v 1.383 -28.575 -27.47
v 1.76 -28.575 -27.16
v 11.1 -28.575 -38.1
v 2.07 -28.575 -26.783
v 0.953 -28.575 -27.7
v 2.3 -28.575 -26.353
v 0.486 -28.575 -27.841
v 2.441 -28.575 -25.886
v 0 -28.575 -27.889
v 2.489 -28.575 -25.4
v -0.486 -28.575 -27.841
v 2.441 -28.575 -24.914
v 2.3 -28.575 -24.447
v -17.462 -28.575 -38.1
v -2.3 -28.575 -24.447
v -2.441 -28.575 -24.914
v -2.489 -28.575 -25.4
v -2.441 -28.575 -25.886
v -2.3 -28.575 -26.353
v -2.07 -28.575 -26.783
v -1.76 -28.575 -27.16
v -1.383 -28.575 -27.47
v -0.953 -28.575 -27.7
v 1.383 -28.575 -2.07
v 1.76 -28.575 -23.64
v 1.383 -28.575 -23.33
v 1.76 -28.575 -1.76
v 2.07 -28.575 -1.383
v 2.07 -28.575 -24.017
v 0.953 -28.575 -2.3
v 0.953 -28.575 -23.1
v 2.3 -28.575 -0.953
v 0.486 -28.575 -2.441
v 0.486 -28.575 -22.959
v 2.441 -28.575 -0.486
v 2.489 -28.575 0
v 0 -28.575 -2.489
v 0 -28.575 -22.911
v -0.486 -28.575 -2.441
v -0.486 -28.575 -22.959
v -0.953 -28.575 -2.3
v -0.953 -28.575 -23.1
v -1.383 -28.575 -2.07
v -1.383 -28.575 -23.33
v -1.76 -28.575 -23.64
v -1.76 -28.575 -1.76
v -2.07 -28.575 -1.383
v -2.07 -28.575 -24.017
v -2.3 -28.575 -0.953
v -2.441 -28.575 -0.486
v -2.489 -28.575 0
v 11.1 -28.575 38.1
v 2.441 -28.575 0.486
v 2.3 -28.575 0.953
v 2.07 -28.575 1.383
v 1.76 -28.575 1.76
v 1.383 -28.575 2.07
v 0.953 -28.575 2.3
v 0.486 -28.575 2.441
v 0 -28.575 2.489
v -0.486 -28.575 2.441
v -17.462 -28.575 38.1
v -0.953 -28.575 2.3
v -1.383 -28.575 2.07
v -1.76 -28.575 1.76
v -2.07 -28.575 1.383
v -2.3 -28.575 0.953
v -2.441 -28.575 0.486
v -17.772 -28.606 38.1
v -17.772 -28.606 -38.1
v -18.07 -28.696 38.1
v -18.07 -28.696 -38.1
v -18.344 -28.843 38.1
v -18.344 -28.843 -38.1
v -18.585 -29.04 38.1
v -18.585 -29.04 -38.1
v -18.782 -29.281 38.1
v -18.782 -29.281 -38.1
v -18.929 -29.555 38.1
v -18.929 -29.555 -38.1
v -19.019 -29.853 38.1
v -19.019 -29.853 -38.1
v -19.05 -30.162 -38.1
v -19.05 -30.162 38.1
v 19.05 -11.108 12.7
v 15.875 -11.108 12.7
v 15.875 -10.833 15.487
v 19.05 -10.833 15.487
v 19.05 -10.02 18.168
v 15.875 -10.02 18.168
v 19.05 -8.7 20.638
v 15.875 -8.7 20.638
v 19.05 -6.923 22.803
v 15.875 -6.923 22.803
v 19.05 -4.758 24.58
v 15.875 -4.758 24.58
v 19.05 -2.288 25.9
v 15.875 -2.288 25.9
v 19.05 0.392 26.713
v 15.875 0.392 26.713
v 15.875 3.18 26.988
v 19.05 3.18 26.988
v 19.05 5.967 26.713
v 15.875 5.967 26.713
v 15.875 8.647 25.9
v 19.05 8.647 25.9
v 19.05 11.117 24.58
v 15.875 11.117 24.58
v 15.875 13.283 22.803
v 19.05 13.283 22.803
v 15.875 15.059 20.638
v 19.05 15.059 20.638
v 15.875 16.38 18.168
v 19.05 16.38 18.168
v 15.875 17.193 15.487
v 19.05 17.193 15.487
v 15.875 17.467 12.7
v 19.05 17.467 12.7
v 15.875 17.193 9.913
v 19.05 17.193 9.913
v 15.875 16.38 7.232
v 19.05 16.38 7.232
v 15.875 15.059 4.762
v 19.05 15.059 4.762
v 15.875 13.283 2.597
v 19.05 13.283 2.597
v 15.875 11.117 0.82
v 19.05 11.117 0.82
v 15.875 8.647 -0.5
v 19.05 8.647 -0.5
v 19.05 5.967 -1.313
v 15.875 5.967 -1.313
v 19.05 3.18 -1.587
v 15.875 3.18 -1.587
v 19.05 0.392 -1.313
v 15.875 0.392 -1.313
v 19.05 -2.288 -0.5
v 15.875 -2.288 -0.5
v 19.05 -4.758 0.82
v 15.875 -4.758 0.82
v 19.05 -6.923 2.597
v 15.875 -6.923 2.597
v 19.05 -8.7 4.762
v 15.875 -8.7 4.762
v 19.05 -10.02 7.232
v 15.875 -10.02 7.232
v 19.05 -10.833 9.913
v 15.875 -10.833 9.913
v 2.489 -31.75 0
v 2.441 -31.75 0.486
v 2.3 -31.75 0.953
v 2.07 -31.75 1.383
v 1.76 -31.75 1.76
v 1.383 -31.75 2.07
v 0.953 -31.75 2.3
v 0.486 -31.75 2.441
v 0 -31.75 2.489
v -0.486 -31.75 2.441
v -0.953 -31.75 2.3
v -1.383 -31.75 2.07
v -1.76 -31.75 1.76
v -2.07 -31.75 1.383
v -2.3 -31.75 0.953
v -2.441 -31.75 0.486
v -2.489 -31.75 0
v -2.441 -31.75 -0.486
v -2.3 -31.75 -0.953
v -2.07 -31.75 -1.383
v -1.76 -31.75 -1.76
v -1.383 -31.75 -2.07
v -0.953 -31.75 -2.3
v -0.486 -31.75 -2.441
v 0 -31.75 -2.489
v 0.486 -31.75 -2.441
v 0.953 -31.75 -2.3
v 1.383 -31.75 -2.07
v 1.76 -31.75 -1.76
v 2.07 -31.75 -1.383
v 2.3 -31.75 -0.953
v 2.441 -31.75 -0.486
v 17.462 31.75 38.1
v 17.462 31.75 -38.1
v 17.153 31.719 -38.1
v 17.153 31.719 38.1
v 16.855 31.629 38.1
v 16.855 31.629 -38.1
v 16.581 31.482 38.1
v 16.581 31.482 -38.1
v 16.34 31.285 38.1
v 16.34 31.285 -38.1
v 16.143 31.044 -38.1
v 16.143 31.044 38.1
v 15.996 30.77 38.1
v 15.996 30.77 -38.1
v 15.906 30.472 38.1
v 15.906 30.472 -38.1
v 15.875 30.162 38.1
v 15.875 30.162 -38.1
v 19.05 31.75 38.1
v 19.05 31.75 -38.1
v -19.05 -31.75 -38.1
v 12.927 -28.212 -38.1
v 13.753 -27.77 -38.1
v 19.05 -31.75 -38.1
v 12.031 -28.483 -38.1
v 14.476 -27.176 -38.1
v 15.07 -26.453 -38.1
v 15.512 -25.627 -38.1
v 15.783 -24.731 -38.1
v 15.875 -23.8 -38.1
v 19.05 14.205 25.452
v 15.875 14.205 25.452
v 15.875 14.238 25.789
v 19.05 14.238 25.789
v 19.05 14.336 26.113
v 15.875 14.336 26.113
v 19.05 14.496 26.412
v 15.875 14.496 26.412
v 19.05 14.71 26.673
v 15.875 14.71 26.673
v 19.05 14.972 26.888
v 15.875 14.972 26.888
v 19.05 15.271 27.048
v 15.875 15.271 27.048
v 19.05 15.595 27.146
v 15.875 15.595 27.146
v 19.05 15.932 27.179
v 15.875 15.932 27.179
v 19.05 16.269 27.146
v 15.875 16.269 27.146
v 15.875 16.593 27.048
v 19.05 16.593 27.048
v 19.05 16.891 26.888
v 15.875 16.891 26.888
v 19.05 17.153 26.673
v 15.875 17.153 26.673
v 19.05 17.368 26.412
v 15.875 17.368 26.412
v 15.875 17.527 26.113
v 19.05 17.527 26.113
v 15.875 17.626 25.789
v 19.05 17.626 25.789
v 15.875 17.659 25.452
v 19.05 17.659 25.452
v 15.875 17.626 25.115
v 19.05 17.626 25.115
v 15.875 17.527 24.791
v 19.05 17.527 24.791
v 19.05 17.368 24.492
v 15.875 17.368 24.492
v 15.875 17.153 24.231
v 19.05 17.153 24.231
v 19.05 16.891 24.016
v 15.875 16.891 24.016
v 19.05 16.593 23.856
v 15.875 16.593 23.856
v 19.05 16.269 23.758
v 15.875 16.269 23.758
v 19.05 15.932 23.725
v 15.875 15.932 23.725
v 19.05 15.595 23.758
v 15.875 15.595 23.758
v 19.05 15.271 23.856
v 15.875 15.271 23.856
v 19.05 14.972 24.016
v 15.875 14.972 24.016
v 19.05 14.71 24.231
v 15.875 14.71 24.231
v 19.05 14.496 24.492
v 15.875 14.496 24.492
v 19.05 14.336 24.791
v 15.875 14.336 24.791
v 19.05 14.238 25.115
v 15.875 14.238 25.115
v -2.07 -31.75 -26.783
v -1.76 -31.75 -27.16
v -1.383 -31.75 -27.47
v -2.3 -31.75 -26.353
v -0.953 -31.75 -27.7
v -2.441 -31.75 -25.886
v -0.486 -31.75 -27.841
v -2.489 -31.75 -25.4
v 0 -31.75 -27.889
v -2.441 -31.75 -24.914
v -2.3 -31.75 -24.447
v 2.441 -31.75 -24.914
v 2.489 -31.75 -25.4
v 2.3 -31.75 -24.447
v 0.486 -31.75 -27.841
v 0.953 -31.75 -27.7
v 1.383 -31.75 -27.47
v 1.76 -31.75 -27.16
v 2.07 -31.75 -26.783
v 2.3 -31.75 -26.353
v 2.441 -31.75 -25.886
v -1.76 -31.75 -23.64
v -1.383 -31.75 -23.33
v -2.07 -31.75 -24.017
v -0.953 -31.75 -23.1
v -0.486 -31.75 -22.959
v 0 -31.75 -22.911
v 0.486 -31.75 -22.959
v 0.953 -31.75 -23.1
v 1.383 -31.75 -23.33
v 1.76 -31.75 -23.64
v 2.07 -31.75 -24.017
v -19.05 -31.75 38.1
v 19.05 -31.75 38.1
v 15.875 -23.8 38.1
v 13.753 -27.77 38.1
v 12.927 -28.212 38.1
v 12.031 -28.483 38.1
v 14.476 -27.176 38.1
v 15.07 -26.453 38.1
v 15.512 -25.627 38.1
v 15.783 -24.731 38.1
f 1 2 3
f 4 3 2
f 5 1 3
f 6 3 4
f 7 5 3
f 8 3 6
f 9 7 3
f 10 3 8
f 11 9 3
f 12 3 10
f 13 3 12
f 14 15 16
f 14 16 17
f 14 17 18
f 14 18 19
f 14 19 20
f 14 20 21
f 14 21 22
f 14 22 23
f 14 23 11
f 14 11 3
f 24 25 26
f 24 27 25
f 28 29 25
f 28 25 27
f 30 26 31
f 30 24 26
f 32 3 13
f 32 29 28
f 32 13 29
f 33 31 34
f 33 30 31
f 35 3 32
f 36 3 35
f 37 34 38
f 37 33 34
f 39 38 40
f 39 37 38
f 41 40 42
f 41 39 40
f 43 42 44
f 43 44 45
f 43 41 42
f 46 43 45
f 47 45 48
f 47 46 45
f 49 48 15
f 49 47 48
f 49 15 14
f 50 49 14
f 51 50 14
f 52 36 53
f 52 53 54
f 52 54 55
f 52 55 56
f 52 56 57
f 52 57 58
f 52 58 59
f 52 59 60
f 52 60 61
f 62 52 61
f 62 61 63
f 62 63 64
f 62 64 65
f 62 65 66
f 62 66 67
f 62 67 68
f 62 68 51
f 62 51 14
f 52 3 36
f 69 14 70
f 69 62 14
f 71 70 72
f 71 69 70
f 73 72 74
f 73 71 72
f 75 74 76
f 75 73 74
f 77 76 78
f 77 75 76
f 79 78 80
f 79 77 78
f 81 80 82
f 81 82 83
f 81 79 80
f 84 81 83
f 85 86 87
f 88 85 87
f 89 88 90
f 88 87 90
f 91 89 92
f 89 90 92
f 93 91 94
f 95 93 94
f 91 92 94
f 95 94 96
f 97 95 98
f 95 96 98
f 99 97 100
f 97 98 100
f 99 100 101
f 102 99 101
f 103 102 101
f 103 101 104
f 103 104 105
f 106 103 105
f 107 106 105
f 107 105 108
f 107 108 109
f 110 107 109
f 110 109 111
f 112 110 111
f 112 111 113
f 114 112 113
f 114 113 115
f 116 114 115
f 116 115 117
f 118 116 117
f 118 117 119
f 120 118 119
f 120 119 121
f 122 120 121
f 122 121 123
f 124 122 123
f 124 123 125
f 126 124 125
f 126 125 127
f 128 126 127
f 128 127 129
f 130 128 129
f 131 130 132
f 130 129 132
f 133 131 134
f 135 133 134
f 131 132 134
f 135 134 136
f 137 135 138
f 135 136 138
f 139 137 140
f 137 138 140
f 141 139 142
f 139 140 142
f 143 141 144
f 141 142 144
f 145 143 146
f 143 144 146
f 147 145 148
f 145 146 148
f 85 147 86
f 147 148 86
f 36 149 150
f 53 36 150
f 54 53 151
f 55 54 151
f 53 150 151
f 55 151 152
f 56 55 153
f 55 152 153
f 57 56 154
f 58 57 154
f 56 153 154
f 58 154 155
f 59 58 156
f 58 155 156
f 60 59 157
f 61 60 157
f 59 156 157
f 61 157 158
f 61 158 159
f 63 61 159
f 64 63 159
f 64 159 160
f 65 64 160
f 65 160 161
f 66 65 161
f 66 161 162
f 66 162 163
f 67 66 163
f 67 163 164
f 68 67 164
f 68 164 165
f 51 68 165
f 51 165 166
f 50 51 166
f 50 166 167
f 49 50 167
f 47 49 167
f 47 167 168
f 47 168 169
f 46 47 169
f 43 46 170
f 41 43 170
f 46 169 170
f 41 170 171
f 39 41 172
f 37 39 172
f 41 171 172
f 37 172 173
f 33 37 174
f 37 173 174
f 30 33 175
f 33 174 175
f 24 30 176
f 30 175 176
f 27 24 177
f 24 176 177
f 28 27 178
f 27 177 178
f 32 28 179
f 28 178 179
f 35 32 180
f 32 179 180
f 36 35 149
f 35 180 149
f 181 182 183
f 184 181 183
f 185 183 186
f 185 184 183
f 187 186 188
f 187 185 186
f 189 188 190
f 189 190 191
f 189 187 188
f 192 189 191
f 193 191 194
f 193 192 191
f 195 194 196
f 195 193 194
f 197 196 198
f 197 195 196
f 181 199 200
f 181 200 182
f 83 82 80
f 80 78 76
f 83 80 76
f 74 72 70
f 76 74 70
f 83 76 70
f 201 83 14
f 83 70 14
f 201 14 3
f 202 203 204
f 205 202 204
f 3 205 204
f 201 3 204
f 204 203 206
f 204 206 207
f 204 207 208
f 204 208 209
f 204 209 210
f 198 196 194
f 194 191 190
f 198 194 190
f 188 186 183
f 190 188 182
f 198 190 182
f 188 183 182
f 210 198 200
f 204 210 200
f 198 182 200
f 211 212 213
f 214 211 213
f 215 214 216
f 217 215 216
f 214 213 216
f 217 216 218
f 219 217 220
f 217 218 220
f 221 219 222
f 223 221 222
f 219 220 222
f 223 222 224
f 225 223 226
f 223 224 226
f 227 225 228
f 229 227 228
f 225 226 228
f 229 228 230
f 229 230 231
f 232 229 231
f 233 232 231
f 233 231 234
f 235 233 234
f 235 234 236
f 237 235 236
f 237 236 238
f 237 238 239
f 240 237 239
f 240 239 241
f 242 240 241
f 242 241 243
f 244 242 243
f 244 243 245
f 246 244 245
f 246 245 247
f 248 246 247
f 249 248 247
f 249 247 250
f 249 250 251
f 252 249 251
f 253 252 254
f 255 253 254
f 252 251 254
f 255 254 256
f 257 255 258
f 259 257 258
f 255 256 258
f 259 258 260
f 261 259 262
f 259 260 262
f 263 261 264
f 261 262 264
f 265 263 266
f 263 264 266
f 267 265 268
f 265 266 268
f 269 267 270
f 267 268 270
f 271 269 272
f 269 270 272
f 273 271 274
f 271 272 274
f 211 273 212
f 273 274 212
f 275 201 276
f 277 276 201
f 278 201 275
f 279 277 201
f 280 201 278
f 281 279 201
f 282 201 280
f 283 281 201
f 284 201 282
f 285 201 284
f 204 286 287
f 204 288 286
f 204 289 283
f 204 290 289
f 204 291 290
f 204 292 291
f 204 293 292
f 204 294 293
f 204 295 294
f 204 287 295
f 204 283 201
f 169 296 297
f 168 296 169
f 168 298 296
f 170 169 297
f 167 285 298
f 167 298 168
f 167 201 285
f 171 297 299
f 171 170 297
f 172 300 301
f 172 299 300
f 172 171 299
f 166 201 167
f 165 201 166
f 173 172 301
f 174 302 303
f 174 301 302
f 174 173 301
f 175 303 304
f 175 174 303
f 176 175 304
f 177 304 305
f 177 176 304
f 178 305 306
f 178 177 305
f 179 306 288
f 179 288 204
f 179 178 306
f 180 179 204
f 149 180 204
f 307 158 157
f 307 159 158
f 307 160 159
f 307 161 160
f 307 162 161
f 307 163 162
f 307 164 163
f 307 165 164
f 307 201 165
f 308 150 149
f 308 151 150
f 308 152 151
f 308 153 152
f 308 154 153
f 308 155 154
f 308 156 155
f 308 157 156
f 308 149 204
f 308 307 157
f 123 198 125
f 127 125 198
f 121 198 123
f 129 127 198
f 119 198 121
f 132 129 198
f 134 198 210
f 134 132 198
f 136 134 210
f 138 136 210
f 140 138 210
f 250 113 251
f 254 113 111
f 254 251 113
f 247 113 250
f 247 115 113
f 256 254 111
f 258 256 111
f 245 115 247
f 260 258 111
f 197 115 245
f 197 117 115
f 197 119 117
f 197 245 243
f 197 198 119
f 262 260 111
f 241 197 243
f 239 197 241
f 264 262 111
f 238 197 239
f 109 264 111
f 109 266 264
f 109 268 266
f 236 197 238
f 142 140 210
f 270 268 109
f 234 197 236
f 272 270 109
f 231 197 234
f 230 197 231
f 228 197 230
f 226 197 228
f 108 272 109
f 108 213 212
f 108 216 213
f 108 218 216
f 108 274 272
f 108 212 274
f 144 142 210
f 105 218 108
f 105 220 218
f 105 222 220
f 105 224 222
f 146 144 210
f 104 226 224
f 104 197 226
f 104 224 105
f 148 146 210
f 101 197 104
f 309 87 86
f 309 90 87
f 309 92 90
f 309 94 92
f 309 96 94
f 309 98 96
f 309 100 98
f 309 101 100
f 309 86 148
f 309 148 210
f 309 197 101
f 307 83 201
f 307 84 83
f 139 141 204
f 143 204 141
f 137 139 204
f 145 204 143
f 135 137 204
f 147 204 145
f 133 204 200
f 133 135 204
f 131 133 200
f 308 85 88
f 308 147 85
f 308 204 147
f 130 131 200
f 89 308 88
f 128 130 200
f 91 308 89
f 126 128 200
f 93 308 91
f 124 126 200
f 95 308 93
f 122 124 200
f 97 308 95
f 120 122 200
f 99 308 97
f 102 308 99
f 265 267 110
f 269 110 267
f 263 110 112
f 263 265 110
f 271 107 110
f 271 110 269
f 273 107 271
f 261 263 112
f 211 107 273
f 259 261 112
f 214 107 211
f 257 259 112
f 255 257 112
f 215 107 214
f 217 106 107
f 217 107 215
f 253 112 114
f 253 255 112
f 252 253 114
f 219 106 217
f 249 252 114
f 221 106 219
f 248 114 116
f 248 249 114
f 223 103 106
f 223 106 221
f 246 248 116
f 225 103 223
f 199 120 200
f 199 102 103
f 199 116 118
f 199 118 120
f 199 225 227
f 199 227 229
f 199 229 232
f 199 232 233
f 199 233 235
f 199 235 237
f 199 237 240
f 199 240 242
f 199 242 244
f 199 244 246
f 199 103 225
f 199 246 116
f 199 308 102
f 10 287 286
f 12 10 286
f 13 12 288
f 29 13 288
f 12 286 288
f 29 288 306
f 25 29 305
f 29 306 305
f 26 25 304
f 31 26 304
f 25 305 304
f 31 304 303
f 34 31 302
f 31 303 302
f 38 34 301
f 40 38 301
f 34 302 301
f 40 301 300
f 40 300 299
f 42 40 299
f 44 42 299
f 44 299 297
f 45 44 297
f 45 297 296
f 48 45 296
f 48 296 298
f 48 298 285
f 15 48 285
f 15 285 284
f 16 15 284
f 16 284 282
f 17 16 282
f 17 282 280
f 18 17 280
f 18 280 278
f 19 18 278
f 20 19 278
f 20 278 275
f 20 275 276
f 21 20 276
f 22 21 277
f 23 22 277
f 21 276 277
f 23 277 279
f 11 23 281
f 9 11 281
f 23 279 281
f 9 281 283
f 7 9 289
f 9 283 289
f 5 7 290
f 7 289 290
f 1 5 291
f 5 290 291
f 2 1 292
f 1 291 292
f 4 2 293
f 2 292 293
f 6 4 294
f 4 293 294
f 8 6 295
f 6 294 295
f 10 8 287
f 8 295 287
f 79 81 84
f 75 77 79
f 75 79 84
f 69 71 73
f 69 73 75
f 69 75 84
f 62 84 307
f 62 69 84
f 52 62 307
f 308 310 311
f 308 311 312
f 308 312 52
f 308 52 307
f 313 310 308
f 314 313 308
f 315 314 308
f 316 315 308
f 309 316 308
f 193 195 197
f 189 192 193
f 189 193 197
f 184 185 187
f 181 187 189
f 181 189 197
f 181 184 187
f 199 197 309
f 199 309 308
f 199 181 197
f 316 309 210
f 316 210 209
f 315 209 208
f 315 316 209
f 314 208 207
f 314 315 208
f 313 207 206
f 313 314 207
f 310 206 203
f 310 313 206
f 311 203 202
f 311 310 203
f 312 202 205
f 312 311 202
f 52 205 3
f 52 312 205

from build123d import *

# Parameters (mm, degrees)
BOSS_EXTRUDE1_DEPTH = 38.1
SKETCH3_R           = 14.2875
SKETCH3_R_2         = 1.7272
CUT_EXTRUDE1_DEPTH  = 61.658289829
SKETCH9_R           = 2.4892
CUT_EXTRUDE2_DEPTH  = 77.464125575


with BuildPart() as part:
    # Sketch2 → Boss-Extrude1 (new, symmetric)
    with BuildSketch(Plane.XY):
        with BuildLine():
            Line((-19.05, -31.75), (19.05, -31.75))
            Line((19.05, -31.75), (19.05, 31.75))
            Line((19.05, 31.75), (17.4625, 31.75))
            ThreePointArc((17.4625, 31.75), (16.339967985, 31.285032015), (15.875, 30.1625))
            Line((15.875, 30.1625), (15.875, -23.7998))
            ThreePointArc((15.875, -23.7998), (14.476376302, -27.176376302), (11.0998, -28.575))
            Line((11.0998, -28.575), (-17.4625, -28.575))
            ThreePointArc((-17.4625, -28.575), (-18.585032015, -29.039967985), (-19.05, -30.1625))
            Line((-19.05, -30.1625), (-19.05, -31.75))
        make_face()
    extrude(amount=BOSS_EXTRUDE1_DEPTH, both=True)

    # Sketch3 → Cut-Extrude1 (cut, through all)
    with BuildSketch(Plane.ZY.offset(-15.875)):
        with Locations(Location((12.70000005, 3.1797625, 0), (0, 0, 270))):
            Circle(SKETCH3_R)
        with Locations(Location((25.451963742, 15.931726192, 0), (0, 0, 270))):
            Circle(SKETCH3_R_2)
    extrude(amount=-CUT_EXTRUDE1_DEPTH, mode=Mode.SUBTRACT)

    # Sketch9 → Cut-Extrude2 (cut, through all)
    with BuildSketch(Plane.XZ.offset(31.75)):
        Circle(SKETCH9_R)
        with Locations((0, -25.4)):
            Circle(SKETCH9_R)
    extrude(amount=-CUT_EXTRUDE2_DEPTH, mode=Mode.SUBTRACT)


solid = part.part
